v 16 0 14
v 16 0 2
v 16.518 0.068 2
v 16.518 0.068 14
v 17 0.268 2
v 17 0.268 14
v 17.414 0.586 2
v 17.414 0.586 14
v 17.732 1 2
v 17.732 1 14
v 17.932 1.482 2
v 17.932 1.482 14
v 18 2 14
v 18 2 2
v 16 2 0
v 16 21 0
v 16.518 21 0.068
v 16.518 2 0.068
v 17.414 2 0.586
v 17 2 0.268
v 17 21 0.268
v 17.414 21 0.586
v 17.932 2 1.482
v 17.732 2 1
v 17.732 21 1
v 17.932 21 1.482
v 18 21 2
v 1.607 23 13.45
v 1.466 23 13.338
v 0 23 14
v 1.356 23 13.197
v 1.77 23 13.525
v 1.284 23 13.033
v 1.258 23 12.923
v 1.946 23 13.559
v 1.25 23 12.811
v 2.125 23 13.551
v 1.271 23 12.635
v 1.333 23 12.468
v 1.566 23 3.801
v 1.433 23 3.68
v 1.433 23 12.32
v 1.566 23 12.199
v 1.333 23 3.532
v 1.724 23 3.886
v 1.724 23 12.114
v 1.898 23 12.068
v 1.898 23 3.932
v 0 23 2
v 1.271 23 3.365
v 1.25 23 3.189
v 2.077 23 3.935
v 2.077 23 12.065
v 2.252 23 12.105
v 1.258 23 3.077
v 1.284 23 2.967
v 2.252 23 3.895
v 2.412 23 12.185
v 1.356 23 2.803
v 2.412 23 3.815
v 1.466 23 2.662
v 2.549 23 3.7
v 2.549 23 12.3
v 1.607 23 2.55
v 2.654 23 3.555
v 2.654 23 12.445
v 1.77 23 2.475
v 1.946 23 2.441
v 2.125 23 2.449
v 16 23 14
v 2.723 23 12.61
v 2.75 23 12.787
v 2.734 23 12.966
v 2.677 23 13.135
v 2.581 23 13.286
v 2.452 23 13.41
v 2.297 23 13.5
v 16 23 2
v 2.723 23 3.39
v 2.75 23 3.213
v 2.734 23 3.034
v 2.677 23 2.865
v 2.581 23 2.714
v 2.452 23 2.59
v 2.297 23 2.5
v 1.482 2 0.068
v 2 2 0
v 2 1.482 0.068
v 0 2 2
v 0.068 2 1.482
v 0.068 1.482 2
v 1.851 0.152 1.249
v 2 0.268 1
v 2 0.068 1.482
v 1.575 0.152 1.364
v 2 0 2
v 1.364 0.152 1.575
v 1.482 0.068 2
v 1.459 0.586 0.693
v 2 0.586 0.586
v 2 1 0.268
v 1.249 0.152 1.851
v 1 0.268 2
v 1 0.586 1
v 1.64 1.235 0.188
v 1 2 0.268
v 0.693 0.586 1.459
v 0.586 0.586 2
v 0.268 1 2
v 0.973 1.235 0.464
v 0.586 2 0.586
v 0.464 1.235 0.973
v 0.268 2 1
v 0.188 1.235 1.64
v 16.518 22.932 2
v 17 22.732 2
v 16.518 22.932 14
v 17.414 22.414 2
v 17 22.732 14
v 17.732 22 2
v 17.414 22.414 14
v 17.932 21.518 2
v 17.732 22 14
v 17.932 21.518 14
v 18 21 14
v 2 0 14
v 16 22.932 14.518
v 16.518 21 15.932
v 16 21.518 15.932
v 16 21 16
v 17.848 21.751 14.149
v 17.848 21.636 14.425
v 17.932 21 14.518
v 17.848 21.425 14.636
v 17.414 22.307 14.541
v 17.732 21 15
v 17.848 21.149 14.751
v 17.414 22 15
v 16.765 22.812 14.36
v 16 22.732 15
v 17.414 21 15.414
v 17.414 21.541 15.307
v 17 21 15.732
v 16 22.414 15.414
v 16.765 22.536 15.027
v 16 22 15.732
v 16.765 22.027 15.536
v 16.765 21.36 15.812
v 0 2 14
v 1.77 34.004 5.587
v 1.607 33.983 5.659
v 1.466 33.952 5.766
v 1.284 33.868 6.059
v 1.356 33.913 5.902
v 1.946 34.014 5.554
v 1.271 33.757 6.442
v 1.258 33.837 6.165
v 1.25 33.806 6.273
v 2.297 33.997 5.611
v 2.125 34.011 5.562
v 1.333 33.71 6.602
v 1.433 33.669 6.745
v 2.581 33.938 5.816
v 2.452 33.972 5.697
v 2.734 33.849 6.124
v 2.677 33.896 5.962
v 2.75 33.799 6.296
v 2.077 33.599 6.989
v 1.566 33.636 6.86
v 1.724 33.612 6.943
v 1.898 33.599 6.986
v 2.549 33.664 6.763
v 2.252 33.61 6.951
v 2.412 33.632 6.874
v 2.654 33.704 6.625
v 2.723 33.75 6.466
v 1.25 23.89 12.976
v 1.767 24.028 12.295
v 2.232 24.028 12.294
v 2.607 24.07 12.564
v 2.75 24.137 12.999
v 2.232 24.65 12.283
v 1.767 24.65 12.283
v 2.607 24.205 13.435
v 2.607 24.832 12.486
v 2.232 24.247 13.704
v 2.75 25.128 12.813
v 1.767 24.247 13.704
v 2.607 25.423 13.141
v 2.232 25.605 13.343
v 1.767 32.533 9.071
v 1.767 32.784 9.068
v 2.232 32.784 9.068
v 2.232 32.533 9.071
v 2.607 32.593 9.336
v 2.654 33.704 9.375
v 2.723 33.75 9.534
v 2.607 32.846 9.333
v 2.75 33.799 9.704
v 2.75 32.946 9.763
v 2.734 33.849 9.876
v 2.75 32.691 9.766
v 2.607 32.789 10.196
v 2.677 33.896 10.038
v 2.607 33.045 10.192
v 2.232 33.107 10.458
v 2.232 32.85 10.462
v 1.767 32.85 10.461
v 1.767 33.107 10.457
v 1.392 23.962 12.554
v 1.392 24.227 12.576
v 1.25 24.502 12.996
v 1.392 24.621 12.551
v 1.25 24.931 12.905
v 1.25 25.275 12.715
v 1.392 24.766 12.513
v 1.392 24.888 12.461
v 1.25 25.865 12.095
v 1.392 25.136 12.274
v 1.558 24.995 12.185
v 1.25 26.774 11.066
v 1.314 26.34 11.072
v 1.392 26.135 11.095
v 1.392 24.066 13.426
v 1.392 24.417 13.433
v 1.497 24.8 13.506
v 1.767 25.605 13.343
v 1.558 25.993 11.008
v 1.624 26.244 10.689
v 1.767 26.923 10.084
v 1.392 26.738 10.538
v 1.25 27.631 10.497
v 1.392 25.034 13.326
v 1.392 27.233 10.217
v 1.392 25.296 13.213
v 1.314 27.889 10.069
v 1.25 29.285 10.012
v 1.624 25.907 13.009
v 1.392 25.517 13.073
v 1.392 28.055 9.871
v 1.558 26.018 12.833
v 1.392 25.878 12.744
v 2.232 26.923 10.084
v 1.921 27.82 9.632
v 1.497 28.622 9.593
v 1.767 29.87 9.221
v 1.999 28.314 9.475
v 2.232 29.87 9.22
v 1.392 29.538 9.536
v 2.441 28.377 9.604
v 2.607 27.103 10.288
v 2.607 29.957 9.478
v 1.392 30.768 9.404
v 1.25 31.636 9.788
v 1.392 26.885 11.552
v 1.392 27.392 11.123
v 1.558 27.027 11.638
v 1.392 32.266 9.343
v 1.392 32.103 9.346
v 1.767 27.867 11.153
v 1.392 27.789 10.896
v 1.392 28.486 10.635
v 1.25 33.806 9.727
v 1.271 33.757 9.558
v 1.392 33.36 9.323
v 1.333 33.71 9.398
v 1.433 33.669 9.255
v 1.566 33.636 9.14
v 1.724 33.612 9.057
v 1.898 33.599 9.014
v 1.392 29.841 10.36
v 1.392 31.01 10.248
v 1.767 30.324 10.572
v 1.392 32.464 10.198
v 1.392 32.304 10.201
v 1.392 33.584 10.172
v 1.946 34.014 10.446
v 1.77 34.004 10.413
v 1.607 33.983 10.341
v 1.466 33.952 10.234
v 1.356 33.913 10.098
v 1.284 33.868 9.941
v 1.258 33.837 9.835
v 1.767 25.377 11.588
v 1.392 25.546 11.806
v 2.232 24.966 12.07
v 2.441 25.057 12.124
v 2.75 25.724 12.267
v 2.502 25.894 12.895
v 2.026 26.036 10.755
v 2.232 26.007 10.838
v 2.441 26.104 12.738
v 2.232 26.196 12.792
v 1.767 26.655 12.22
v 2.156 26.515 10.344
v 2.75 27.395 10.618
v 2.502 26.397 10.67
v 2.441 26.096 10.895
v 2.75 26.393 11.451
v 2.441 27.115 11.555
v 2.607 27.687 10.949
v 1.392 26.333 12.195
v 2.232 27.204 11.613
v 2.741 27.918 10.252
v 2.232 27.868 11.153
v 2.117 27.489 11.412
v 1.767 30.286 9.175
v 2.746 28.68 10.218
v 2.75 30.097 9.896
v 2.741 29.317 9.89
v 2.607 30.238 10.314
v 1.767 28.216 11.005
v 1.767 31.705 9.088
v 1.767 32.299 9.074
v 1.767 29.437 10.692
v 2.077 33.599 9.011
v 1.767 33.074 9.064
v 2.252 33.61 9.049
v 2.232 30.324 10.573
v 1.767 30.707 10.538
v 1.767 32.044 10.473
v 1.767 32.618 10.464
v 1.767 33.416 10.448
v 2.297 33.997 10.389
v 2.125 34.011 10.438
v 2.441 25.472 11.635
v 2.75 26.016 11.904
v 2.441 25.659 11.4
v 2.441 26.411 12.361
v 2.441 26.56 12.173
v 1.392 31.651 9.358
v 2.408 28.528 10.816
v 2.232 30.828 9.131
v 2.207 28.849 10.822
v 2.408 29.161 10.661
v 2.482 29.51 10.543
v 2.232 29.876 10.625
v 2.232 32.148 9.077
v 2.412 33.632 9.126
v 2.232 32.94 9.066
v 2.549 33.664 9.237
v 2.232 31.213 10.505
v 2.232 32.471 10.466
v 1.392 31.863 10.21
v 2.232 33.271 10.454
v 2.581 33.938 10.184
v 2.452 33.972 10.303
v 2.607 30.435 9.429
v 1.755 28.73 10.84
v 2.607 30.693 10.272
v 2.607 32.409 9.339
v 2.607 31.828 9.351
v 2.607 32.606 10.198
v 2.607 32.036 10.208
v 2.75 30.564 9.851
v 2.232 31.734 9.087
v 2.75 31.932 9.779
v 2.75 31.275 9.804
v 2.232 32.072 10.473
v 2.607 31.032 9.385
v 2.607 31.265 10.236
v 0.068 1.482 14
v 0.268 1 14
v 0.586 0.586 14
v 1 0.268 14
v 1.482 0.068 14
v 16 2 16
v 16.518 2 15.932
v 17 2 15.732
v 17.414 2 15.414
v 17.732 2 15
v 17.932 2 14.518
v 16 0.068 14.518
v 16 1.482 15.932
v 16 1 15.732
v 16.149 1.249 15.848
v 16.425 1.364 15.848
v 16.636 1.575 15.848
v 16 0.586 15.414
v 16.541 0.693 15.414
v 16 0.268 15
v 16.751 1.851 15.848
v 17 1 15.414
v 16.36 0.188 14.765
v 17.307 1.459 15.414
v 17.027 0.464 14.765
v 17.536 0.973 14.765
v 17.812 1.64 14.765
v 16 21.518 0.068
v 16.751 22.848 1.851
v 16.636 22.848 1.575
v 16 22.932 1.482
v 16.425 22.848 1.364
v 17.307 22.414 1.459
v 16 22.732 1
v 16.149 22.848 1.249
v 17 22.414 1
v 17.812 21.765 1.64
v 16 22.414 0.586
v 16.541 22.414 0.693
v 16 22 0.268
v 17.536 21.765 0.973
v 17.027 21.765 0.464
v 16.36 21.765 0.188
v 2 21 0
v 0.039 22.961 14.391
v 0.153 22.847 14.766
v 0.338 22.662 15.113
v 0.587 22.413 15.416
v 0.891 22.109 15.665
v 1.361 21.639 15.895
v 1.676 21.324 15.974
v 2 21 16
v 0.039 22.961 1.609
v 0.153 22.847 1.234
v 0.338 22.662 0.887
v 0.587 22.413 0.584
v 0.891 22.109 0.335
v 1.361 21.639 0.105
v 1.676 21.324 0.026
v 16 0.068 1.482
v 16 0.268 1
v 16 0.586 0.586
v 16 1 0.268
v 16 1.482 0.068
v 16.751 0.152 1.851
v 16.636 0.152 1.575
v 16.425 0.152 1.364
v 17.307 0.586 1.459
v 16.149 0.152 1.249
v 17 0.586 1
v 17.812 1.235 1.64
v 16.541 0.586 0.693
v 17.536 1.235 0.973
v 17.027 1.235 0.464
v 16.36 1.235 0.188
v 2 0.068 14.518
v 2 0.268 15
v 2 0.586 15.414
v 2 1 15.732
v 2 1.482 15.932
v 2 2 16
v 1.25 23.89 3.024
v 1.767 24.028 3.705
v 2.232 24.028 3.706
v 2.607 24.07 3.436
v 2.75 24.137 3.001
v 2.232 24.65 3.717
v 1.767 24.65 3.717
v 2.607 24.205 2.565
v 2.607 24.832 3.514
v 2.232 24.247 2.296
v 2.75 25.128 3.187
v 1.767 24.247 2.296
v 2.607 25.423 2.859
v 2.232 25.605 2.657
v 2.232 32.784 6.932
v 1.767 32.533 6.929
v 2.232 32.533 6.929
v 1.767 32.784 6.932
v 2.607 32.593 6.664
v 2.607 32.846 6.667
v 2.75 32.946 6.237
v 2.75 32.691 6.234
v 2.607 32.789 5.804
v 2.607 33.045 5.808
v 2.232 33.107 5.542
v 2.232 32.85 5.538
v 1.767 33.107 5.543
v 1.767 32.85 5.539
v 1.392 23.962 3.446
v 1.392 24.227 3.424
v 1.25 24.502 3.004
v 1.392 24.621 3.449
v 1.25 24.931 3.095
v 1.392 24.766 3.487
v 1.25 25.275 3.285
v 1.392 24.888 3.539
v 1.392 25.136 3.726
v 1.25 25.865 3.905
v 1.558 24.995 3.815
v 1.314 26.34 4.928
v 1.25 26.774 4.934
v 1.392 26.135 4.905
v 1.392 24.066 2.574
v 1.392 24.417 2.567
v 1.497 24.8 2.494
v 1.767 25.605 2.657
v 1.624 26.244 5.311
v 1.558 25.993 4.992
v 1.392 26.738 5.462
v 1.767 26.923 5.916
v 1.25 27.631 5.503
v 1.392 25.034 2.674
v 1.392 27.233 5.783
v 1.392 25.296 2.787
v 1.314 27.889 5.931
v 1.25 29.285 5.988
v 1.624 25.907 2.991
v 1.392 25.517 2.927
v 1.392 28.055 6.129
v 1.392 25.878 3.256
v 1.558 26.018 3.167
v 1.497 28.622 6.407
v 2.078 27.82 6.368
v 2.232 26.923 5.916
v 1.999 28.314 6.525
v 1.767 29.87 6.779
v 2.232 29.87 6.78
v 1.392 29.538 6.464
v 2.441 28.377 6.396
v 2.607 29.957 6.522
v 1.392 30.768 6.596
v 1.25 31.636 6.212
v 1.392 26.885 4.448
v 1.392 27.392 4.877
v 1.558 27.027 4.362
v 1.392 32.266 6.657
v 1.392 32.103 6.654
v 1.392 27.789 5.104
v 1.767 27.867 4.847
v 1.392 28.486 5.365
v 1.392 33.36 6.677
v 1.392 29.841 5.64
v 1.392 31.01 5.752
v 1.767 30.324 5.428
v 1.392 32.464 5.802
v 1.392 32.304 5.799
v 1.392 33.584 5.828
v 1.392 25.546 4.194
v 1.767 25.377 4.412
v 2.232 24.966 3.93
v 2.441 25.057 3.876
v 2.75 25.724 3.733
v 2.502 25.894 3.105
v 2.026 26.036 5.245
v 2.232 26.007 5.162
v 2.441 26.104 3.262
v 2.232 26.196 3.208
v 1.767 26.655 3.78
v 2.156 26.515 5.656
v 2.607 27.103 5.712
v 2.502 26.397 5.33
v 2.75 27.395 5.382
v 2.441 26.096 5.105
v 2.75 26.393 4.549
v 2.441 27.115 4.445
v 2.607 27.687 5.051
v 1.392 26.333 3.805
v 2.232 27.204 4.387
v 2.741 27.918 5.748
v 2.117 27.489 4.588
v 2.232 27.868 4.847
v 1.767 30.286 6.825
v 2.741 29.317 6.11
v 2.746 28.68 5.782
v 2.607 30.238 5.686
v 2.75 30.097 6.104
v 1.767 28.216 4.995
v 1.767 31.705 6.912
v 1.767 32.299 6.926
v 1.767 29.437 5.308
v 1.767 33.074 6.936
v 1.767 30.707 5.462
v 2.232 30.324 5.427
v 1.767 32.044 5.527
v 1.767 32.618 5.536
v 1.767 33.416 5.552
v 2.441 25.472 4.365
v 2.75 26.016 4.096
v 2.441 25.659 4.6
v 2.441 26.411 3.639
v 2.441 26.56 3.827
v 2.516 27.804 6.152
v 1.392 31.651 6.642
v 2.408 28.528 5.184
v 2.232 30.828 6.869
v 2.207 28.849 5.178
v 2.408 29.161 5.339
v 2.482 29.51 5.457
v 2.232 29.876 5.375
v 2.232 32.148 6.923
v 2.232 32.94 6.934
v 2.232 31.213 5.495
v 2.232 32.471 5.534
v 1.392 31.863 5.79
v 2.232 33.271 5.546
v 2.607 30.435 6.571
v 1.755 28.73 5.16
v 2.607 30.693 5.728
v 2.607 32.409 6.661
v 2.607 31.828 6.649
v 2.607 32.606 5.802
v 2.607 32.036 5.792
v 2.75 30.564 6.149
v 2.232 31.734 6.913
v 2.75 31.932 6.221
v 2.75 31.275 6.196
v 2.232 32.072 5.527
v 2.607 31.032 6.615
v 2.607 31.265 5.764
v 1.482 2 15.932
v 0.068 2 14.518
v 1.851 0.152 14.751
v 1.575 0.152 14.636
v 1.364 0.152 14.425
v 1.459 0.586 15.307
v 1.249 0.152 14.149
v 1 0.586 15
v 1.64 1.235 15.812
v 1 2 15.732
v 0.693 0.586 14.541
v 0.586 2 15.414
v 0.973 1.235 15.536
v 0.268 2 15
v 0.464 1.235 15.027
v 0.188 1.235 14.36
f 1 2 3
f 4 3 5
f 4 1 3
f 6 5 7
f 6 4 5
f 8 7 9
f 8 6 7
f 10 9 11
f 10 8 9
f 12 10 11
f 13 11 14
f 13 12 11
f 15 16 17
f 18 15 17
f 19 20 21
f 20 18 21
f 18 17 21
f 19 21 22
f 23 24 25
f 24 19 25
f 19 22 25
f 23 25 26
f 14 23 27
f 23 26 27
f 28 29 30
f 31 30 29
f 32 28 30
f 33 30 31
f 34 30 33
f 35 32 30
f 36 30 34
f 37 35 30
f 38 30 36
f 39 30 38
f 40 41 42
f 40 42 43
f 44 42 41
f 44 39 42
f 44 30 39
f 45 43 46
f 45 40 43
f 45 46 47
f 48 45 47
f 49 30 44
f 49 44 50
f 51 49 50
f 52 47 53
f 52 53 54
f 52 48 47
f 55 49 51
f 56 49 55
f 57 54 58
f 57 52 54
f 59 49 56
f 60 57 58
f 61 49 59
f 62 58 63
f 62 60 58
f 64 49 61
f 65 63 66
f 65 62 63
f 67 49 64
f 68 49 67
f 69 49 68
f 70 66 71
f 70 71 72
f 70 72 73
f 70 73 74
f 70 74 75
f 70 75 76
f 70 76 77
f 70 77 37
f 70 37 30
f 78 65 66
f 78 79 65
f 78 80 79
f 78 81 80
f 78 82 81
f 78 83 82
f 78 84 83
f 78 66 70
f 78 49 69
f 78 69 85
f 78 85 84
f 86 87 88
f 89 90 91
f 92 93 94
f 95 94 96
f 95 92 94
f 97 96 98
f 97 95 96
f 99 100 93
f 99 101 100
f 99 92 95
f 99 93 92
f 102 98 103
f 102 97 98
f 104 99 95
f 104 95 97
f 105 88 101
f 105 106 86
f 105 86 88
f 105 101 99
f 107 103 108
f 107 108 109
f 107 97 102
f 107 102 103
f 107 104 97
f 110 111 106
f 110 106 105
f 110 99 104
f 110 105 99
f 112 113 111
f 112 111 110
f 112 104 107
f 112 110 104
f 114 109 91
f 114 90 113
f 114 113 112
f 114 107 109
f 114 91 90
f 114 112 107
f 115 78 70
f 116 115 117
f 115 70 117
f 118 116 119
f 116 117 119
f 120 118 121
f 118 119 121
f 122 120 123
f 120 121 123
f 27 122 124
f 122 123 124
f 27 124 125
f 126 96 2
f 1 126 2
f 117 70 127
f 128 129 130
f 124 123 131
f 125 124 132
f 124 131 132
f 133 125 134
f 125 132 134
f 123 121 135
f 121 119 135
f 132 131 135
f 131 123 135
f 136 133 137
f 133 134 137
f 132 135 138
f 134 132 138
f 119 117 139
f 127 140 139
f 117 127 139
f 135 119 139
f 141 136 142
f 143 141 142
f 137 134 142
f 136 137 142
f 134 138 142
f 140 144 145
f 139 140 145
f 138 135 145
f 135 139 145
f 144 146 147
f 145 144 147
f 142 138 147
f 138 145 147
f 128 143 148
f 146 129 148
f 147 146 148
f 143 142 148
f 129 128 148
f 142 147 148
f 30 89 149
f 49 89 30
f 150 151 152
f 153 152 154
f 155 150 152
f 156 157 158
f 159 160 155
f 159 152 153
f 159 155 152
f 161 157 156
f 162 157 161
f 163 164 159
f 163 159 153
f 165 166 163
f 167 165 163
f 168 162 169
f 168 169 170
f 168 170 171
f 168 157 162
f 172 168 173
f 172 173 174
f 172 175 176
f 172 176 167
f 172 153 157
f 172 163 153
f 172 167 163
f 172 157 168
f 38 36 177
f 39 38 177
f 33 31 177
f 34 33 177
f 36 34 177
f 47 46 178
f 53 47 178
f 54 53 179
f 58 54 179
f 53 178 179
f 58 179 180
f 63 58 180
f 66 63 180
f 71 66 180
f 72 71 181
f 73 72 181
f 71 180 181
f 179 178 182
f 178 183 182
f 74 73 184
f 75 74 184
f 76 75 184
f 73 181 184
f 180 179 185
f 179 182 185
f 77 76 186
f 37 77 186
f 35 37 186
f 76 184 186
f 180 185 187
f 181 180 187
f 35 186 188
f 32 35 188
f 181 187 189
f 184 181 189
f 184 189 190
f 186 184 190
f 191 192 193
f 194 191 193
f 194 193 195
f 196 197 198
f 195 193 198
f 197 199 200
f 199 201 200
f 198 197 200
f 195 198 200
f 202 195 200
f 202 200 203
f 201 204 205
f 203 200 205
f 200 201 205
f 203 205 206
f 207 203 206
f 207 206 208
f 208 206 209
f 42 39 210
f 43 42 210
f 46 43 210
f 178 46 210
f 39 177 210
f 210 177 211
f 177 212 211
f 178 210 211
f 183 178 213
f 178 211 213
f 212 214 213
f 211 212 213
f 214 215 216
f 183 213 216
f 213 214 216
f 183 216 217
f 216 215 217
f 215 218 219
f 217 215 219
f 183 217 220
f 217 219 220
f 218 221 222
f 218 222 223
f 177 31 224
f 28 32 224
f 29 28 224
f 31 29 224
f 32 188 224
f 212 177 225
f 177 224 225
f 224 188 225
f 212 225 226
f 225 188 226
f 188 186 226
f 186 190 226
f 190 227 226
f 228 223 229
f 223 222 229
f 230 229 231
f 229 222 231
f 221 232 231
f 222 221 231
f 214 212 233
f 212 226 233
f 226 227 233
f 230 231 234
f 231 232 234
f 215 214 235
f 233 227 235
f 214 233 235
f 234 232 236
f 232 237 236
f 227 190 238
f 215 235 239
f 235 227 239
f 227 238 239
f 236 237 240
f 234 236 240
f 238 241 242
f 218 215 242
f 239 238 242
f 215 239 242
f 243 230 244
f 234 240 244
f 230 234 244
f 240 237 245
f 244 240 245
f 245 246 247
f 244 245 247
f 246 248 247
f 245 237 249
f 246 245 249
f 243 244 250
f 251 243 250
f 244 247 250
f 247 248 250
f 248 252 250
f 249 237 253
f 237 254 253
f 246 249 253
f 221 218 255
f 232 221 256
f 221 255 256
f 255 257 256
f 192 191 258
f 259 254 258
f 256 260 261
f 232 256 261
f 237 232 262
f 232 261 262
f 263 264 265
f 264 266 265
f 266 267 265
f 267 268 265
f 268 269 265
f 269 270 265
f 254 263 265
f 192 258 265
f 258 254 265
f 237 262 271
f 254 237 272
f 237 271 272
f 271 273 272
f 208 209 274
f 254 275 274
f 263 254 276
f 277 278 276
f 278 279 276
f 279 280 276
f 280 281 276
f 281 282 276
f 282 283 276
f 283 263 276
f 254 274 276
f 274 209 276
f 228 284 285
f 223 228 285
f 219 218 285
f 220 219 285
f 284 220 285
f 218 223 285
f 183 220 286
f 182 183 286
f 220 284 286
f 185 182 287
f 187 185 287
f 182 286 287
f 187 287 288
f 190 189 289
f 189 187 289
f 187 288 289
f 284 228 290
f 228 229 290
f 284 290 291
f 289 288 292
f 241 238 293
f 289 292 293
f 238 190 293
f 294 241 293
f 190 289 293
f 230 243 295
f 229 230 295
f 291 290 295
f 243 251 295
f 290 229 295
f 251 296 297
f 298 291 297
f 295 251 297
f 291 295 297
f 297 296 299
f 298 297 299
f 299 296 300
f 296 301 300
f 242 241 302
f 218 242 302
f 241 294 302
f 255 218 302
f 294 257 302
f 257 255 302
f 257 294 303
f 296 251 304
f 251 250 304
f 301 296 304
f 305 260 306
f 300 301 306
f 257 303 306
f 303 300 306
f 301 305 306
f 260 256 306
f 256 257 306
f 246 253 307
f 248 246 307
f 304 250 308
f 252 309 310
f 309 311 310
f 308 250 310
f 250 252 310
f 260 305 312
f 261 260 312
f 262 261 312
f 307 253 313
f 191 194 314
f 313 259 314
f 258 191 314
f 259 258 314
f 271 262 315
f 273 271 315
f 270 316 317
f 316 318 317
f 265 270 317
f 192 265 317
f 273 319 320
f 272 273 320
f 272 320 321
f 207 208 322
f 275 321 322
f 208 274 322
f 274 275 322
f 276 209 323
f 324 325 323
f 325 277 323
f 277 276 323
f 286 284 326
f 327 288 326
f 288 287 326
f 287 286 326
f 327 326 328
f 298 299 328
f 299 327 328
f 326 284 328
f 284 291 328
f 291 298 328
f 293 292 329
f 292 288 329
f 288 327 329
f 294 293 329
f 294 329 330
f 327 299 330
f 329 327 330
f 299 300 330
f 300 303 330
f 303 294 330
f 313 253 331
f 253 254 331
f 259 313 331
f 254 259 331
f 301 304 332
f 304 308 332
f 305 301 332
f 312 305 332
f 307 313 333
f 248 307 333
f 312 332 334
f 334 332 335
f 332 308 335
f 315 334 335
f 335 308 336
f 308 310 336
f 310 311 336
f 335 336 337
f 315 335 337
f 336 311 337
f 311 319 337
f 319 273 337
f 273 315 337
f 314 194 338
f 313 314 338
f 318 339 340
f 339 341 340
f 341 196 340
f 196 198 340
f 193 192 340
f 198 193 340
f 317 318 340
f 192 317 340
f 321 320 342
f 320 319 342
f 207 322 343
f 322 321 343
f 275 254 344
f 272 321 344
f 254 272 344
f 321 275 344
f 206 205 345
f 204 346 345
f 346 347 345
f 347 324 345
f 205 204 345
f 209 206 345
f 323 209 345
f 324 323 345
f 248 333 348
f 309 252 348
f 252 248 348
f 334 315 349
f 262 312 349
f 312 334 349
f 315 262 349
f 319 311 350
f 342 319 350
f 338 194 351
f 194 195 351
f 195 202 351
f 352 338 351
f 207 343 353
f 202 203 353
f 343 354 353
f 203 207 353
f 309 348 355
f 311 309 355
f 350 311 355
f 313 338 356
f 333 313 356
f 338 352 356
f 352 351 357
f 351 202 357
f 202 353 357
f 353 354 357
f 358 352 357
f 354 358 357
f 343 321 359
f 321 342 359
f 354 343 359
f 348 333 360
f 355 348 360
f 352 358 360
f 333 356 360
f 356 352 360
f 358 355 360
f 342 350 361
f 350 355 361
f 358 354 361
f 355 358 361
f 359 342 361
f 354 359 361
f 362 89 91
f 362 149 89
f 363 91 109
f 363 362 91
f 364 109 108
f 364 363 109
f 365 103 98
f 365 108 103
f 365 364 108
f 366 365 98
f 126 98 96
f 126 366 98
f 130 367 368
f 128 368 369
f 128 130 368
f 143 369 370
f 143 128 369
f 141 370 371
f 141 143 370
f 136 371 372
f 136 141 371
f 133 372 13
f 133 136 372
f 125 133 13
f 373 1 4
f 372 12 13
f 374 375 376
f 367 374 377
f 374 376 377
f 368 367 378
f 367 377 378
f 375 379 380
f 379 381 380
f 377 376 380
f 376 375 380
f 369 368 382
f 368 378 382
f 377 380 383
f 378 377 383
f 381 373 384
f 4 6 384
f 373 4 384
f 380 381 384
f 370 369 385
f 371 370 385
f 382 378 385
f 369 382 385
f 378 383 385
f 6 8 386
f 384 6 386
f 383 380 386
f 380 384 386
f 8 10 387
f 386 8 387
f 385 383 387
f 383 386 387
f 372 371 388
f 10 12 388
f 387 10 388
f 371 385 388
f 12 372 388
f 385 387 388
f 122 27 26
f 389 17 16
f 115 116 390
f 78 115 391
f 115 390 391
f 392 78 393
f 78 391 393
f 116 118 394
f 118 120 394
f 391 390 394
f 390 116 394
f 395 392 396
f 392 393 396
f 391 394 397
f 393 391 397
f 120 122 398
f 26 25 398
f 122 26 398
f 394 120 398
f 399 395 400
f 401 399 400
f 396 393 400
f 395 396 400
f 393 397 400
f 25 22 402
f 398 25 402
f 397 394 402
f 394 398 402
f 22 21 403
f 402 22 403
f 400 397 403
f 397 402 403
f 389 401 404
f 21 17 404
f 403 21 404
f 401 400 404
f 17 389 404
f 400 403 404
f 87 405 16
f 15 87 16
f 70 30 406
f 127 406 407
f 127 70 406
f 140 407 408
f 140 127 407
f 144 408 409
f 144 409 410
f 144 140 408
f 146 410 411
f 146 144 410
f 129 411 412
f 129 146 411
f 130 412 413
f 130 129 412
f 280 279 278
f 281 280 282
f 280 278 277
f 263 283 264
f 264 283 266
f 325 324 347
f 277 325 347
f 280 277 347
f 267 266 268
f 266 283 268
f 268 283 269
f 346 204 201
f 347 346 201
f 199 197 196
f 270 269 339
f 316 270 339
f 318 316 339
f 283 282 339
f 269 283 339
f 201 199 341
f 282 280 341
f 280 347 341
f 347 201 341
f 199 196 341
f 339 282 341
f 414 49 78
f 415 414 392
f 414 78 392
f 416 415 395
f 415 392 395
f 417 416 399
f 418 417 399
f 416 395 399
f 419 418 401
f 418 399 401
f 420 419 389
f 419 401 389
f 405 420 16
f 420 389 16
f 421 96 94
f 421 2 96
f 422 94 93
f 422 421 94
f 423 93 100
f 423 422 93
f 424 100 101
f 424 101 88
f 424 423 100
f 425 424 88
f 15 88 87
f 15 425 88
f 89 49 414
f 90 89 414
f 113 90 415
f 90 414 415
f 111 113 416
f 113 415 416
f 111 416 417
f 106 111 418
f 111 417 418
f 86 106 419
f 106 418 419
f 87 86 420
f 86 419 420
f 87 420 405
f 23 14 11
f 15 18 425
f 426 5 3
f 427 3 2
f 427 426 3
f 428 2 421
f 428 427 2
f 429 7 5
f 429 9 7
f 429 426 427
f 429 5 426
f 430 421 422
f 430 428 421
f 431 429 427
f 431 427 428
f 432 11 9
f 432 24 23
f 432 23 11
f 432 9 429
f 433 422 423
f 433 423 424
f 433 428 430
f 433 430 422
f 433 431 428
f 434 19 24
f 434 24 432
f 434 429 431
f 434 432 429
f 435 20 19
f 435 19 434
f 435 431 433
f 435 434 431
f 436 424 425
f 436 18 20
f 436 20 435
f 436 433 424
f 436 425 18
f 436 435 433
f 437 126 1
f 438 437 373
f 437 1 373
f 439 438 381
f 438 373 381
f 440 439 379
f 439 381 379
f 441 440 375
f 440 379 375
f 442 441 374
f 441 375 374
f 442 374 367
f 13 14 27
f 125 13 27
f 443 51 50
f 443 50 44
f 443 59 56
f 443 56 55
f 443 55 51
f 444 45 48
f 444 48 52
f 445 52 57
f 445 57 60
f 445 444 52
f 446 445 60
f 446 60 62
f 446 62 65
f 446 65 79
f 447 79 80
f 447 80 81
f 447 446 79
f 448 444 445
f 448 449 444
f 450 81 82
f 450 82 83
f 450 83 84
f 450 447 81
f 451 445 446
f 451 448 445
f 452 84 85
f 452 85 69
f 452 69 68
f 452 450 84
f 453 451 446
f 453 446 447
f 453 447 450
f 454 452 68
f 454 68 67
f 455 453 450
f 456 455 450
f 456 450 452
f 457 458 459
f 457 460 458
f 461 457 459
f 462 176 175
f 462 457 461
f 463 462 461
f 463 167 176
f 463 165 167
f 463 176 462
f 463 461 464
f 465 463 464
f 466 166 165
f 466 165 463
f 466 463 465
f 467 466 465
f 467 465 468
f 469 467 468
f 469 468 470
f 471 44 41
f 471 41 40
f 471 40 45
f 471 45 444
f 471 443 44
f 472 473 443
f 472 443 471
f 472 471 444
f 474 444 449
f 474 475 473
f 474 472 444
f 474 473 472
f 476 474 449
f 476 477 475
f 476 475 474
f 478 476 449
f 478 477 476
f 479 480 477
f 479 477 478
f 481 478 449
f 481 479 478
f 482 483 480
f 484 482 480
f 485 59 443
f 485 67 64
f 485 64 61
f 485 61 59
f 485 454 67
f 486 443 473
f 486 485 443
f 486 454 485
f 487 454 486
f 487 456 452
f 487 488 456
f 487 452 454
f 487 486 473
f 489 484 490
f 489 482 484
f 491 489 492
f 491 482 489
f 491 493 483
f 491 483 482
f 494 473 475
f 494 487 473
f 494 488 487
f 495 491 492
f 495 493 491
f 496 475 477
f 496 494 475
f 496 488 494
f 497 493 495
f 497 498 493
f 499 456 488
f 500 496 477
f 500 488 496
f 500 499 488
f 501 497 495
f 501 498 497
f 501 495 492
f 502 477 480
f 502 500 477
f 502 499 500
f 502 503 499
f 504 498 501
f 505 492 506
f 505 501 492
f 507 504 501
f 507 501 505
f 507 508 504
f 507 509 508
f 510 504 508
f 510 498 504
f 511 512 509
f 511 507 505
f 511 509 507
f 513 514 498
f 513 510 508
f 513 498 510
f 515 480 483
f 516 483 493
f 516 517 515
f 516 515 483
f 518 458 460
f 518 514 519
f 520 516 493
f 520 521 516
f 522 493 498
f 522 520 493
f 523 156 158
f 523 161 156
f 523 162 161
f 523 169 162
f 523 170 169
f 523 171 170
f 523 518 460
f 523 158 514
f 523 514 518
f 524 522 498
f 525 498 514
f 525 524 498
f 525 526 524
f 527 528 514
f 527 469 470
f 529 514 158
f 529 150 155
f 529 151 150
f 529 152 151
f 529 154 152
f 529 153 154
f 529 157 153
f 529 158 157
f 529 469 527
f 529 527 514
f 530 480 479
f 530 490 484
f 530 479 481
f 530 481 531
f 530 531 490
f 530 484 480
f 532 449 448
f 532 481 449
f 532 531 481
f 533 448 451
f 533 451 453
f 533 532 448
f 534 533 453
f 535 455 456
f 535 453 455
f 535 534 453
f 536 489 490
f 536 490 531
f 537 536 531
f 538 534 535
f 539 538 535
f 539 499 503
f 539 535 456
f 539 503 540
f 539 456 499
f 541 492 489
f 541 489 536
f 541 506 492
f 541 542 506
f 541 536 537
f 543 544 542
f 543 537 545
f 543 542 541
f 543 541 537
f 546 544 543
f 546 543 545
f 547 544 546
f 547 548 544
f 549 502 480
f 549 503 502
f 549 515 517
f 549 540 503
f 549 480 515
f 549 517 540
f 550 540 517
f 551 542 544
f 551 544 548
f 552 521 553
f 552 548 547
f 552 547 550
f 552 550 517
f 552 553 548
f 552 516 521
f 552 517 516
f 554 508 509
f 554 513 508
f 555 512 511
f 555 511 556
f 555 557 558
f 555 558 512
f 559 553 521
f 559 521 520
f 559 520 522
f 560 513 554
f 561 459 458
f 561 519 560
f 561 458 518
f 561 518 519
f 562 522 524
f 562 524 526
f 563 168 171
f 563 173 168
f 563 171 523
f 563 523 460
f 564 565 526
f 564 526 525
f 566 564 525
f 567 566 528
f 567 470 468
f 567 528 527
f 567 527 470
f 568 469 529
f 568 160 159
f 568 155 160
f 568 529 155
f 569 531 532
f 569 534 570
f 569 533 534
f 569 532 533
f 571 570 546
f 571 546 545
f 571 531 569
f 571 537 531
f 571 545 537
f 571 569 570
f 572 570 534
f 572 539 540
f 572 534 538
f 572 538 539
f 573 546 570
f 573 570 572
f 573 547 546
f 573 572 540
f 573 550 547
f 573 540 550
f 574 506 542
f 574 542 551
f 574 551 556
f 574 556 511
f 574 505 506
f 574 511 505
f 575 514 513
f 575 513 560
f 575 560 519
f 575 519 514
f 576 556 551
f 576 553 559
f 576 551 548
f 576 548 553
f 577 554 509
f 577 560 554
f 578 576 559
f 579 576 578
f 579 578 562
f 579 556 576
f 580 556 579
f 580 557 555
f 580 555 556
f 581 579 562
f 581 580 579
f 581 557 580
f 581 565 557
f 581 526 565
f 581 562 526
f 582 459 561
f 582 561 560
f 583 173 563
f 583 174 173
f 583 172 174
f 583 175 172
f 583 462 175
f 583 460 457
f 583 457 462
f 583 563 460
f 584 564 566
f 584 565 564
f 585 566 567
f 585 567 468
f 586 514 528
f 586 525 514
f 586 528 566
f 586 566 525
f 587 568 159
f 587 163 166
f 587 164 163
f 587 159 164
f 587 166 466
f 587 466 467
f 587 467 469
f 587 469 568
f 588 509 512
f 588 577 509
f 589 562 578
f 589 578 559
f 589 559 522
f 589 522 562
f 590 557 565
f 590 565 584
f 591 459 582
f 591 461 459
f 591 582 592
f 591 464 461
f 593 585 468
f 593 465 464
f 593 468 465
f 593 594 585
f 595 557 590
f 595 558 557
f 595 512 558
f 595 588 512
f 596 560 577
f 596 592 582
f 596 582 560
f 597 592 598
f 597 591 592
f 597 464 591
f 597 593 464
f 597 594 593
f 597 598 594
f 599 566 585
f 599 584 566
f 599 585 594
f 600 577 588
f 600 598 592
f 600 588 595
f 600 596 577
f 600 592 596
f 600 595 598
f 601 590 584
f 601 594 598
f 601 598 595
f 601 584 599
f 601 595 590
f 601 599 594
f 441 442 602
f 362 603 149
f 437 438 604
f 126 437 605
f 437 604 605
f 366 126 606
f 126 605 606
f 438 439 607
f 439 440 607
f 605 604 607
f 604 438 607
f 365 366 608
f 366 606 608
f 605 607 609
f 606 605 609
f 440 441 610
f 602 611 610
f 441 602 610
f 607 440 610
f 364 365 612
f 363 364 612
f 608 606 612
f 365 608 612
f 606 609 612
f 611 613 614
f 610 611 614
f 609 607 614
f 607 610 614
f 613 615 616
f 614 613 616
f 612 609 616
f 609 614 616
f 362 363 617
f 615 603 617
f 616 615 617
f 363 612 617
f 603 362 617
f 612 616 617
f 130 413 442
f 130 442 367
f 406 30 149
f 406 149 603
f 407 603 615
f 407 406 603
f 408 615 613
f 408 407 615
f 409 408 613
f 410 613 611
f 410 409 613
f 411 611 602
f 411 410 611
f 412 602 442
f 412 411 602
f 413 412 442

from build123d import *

# Parameters (mm, degrees)
F0_W     = 18
F0_H     = 23
F1_DEPTH = 16
F2_R     = 0.75
F8_R     = 2


with BuildPart() as f1:
    # F0 (on Top) → F1 (new body)
    with BuildSketch(Plane.XY):
        with Locations((9, 11.5)):
            Rectangle(F0_W, F0_H)
    extrude(amount=F1_DEPTH)

    # F5: sweep along a path in F4
    with BuildLine(Plane(origin=(2, 0, 0), x_dir=(0, -1, 0), z_dir=(-1, 0, 0))) as f5_path:
        add(Plane(origin=(2, 0, 0), x_dir=(0, -1, 0), z_dir=(-1, 0, 0)) * Edge.make_bspline(
            [(-23.0005215853, 3.1891802792), (-23.7749723998, 3.0223947387), (-25.4927262434, 2.6524596858), (-26.7959816722, 6.2629262385), (-32.8904530092, 6.2095022364), (-33.6051186574, 6.259200929), (-33.8062010705, 6.2731844373)],
            knots=[0, 0, 0, 0, 0.2232557328, 0.4951875392, 0.8579630796, 1, 1, 1, 1], degree=3))
    # F2 (on face) → F5 (sweep)
    with BuildSketch(Plane(origin=(0, 23, 0), x_dir=(-1, 0, 0), z_dir=(0, 1, 0))):
        with Locations((-2, 3.1886692159)):
            Circle(F2_R)
    sweep(path=f5_path.line)

    # F7: F1 across plane


with BuildPart() as f1_1:
    add(f1.part)
    add(f1.part.mirror(Plane(origin=(9, 11.5, 8), x_dir=(1, 0, 0), z_dir=(0, 0, -1))))

    # F8
    f8_edges = [f1_1.edges().sort_by_distance(p)[0] for p in [
        (0, 11.5, 16),
        (0, 11.5, 0),
        (18, 11.5, 0),
        (18, 0, 8),
        (9, 0, 0),
        (9, 0, 16),
        (0, 0, 8),
        (9, 23, 16),
        (18, 23, 8),
        (9, 23, 0),
        (18, 11.5, 16),
    ]]
    fillet(f8_edges, radius=F8_R)


solid = f1_1.part
